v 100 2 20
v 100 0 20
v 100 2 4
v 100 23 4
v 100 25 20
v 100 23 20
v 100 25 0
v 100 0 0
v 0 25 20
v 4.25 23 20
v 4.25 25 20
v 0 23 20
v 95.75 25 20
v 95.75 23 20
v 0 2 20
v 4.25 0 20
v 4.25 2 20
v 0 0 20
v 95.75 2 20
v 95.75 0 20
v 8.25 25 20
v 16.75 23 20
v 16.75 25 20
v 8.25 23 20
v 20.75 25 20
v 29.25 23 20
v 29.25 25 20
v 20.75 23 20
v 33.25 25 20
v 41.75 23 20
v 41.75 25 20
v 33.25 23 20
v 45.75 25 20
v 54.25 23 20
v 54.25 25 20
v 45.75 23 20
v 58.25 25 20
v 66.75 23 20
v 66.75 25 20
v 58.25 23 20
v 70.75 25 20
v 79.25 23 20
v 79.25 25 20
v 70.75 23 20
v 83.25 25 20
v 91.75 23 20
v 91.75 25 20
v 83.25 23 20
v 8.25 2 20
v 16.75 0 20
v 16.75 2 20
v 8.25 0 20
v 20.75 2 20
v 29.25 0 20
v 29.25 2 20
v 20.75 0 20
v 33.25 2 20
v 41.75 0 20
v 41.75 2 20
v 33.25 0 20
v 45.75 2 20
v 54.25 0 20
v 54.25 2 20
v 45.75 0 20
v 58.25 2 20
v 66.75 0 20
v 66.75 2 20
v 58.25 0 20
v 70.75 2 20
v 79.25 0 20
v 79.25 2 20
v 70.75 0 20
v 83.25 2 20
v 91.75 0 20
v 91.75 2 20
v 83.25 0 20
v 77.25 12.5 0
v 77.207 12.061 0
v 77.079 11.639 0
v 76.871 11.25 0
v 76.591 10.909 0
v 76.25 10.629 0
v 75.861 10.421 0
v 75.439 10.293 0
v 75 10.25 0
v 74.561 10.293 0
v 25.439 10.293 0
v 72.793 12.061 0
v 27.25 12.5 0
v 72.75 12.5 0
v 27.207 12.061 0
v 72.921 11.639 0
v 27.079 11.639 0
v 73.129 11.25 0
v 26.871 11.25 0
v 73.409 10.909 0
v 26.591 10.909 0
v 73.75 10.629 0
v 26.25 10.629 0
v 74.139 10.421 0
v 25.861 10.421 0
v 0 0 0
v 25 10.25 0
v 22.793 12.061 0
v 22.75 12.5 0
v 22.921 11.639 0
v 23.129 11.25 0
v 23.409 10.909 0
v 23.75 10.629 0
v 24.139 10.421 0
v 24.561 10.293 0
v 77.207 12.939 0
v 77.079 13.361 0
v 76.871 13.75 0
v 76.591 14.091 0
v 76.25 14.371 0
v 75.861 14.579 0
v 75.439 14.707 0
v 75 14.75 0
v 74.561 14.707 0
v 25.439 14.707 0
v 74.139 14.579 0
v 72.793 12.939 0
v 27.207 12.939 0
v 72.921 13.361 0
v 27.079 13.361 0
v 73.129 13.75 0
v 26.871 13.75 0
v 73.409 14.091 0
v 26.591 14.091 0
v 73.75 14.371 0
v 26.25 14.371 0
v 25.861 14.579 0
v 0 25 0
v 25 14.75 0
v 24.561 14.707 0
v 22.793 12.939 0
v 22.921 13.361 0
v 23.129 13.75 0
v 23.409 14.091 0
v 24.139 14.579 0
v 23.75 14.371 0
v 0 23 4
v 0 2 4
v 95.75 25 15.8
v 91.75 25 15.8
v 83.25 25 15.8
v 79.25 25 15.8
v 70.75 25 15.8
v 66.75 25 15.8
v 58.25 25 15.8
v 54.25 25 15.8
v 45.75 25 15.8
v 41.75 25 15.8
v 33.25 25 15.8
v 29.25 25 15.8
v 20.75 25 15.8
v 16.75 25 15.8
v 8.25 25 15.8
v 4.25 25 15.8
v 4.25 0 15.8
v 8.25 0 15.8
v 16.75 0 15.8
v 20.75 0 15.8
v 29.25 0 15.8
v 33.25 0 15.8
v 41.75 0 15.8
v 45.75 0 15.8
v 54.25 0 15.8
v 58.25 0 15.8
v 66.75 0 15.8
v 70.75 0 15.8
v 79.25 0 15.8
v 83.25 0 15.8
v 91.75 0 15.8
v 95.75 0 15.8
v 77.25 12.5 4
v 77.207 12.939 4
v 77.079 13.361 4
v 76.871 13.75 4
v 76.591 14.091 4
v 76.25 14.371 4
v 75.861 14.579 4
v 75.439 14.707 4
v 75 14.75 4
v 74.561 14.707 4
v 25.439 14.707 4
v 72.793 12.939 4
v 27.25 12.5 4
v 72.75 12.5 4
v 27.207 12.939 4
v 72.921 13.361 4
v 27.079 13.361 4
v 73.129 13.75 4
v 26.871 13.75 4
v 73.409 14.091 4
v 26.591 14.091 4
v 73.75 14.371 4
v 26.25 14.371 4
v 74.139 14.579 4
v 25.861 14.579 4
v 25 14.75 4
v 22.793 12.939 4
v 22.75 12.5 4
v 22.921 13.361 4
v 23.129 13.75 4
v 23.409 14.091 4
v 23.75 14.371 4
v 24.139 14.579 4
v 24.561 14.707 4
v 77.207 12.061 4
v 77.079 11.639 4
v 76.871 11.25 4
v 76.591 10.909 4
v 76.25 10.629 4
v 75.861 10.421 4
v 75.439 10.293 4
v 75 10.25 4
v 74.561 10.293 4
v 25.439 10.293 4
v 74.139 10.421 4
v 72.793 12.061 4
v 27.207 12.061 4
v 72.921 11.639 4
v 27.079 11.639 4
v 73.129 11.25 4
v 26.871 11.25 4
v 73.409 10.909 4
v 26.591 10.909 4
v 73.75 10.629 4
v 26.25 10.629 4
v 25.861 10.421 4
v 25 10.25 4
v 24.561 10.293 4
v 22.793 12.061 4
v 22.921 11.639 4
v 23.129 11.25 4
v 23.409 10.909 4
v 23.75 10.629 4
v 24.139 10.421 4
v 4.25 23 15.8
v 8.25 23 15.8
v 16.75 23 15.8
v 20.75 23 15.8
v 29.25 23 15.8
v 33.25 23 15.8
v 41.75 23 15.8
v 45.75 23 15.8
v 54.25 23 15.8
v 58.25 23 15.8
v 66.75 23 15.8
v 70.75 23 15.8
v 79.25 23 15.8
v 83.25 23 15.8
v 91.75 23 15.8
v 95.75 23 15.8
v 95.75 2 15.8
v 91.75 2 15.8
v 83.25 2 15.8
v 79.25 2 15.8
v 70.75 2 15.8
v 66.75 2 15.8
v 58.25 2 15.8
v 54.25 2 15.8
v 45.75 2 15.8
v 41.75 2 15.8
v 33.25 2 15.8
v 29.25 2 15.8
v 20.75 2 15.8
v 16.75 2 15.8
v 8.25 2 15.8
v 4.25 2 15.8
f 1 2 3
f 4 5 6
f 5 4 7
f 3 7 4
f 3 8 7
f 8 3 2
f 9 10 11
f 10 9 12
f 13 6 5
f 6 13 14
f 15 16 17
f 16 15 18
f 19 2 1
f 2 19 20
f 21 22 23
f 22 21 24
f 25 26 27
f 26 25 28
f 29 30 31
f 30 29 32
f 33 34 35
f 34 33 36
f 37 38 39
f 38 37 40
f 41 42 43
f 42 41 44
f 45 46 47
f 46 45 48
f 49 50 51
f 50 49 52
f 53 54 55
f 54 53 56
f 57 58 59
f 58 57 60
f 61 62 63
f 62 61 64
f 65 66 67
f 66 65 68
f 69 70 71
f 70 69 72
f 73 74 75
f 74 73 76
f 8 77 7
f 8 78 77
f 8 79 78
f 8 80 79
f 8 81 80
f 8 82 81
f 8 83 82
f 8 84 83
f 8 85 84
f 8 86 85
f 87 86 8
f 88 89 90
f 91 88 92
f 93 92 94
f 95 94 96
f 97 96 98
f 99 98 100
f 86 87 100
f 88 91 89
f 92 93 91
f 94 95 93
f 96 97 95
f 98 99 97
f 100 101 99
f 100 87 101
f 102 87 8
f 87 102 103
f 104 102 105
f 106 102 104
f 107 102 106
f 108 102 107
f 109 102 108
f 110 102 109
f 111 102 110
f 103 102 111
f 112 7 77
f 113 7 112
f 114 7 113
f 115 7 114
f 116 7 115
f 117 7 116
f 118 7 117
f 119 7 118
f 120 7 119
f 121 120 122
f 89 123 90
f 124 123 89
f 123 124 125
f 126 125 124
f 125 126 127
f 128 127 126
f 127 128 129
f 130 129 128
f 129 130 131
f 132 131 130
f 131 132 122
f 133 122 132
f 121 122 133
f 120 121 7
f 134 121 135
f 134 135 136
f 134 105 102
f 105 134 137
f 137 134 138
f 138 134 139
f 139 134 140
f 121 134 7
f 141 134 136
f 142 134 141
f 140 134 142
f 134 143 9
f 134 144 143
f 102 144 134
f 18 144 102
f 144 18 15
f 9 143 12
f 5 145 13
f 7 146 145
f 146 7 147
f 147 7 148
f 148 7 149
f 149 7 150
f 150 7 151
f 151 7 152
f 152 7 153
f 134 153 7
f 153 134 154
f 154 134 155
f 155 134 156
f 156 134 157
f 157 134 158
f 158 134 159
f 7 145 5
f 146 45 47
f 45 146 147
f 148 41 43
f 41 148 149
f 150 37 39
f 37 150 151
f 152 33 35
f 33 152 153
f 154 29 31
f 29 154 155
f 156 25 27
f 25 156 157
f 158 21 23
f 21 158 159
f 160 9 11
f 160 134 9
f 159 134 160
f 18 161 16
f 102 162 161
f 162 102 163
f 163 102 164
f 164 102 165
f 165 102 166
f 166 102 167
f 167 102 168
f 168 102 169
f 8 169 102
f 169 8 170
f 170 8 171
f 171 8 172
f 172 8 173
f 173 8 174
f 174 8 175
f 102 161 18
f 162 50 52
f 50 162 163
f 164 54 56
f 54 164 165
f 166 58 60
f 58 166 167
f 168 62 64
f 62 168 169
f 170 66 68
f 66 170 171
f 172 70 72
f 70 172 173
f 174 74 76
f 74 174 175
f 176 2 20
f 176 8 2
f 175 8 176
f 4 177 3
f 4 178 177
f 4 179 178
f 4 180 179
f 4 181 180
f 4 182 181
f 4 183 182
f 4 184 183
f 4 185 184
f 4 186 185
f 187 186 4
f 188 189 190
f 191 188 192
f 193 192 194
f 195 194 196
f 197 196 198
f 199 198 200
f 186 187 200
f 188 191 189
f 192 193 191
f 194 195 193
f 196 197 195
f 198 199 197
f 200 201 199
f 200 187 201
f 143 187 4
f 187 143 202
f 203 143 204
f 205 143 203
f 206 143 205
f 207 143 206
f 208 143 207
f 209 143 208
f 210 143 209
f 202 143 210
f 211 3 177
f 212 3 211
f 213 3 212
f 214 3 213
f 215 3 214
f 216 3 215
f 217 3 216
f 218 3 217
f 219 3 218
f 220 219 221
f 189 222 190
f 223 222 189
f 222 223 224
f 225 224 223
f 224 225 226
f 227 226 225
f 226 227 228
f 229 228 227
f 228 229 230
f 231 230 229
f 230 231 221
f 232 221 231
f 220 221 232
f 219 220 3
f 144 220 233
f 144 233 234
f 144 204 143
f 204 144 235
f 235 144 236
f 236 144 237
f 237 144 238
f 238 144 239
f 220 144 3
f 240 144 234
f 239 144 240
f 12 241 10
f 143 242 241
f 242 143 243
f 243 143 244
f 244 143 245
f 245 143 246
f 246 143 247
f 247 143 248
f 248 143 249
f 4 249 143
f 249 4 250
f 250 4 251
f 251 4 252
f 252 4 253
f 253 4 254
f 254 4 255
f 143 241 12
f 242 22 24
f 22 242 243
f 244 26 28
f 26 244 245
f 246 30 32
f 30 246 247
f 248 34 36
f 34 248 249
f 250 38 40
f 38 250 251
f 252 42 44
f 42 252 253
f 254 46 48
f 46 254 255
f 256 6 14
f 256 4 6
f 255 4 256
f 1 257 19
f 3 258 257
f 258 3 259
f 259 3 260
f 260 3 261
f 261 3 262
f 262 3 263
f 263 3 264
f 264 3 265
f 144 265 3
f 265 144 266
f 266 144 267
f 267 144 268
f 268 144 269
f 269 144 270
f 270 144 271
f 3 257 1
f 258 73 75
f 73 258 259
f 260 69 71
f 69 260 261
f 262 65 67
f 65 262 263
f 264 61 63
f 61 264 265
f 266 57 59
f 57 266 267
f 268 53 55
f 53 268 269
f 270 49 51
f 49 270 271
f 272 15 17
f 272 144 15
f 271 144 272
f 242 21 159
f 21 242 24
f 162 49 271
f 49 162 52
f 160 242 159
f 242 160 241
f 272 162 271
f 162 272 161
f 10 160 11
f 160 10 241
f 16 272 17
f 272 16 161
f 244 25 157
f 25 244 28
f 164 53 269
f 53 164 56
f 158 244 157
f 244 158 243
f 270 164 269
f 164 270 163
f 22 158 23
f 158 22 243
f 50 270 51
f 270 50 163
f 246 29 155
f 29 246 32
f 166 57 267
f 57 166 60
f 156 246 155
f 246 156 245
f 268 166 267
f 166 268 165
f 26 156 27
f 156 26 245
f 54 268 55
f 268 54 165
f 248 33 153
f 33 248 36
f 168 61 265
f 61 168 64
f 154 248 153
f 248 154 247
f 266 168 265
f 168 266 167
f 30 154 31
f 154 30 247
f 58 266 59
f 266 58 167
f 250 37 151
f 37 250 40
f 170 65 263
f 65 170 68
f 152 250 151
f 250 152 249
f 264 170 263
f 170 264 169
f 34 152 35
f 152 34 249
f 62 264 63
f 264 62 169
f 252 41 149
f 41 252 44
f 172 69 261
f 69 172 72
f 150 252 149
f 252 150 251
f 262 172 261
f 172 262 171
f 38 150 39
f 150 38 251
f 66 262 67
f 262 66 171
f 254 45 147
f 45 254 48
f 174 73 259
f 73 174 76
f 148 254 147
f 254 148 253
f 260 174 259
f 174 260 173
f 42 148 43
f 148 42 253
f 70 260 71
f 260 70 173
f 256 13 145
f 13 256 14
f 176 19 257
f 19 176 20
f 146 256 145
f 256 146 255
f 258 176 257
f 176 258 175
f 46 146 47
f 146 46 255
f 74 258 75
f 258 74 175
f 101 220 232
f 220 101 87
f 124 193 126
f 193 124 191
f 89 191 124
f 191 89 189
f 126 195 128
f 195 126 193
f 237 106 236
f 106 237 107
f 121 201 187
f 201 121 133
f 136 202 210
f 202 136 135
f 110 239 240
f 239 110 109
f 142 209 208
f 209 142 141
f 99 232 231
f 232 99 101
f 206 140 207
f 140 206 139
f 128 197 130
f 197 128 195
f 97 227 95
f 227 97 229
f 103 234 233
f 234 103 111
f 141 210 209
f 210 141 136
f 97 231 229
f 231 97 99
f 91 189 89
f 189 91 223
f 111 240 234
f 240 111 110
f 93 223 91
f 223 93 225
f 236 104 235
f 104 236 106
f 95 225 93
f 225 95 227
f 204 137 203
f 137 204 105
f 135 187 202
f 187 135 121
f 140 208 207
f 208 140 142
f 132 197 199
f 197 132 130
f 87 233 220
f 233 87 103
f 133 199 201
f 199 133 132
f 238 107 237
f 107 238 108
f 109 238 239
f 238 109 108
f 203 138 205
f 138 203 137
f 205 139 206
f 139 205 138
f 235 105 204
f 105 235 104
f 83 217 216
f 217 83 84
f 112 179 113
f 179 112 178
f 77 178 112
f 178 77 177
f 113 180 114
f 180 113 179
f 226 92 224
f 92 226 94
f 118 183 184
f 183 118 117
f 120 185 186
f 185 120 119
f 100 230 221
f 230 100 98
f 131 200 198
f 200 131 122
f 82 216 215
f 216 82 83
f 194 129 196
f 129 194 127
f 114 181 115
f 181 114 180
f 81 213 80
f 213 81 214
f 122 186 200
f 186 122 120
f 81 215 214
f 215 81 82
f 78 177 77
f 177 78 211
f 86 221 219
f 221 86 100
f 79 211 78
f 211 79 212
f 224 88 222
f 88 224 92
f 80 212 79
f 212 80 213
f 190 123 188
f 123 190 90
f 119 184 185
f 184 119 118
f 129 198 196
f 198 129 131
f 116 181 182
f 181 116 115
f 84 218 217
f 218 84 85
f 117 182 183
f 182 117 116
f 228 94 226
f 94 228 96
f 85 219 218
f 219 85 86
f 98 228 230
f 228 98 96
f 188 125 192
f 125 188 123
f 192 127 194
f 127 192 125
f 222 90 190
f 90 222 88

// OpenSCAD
$fn = 32;

// ----------------------------------------------------------------------
// Cable duct: 100 x 25 x 20 mm, 8 fingers
// ----------------------------------------------------------------------

// --- parameters (mm) ---
channel_l = 100;          // duct length, X
channel_w = 25;           // duct width, Y
channel_h = 20;           // duct height, Z
channel_t = 2;            // side wall thickness
floor_t = 4;              // floor thickness
slot_w = 4;               // finger slot width
slot_h = 11.8;            // finger slot height
fingers = 8;              // number of finger slots per side
pitch = 12.5;             // finger pitch
hole_d = 4.5;             // floor mounting hole
hole_n = 2;               // mounting holes in the floor

module shell() {
  difference() {
    cube([channel_l, channel_w, channel_h]);
    /* open top channel */
    translate([-channel_t - 1, channel_t, floor_t])
      cube([channel_l + 2 * channel_t + 2, channel_w - 2 * channel_t, channel_h + 1]);
  }
}

difference() {
  union() {
    shell();
  }
  /* finger slots cut through both side walls */
  for (i = [0 : fingers - 1]) translate([pitch / 2 + i * pitch - slot_w / 2, -1, floor_t + slot_h]) cube([slot_w, channel_w + 2, channel_h]);
  for (i = [0 : hole_n - 1]) translate([(channel_l / hole_n) * (i + 0.5), channel_w / 2, -1]) cylinder(h = floor_t + 2, d = hole_d);
}
